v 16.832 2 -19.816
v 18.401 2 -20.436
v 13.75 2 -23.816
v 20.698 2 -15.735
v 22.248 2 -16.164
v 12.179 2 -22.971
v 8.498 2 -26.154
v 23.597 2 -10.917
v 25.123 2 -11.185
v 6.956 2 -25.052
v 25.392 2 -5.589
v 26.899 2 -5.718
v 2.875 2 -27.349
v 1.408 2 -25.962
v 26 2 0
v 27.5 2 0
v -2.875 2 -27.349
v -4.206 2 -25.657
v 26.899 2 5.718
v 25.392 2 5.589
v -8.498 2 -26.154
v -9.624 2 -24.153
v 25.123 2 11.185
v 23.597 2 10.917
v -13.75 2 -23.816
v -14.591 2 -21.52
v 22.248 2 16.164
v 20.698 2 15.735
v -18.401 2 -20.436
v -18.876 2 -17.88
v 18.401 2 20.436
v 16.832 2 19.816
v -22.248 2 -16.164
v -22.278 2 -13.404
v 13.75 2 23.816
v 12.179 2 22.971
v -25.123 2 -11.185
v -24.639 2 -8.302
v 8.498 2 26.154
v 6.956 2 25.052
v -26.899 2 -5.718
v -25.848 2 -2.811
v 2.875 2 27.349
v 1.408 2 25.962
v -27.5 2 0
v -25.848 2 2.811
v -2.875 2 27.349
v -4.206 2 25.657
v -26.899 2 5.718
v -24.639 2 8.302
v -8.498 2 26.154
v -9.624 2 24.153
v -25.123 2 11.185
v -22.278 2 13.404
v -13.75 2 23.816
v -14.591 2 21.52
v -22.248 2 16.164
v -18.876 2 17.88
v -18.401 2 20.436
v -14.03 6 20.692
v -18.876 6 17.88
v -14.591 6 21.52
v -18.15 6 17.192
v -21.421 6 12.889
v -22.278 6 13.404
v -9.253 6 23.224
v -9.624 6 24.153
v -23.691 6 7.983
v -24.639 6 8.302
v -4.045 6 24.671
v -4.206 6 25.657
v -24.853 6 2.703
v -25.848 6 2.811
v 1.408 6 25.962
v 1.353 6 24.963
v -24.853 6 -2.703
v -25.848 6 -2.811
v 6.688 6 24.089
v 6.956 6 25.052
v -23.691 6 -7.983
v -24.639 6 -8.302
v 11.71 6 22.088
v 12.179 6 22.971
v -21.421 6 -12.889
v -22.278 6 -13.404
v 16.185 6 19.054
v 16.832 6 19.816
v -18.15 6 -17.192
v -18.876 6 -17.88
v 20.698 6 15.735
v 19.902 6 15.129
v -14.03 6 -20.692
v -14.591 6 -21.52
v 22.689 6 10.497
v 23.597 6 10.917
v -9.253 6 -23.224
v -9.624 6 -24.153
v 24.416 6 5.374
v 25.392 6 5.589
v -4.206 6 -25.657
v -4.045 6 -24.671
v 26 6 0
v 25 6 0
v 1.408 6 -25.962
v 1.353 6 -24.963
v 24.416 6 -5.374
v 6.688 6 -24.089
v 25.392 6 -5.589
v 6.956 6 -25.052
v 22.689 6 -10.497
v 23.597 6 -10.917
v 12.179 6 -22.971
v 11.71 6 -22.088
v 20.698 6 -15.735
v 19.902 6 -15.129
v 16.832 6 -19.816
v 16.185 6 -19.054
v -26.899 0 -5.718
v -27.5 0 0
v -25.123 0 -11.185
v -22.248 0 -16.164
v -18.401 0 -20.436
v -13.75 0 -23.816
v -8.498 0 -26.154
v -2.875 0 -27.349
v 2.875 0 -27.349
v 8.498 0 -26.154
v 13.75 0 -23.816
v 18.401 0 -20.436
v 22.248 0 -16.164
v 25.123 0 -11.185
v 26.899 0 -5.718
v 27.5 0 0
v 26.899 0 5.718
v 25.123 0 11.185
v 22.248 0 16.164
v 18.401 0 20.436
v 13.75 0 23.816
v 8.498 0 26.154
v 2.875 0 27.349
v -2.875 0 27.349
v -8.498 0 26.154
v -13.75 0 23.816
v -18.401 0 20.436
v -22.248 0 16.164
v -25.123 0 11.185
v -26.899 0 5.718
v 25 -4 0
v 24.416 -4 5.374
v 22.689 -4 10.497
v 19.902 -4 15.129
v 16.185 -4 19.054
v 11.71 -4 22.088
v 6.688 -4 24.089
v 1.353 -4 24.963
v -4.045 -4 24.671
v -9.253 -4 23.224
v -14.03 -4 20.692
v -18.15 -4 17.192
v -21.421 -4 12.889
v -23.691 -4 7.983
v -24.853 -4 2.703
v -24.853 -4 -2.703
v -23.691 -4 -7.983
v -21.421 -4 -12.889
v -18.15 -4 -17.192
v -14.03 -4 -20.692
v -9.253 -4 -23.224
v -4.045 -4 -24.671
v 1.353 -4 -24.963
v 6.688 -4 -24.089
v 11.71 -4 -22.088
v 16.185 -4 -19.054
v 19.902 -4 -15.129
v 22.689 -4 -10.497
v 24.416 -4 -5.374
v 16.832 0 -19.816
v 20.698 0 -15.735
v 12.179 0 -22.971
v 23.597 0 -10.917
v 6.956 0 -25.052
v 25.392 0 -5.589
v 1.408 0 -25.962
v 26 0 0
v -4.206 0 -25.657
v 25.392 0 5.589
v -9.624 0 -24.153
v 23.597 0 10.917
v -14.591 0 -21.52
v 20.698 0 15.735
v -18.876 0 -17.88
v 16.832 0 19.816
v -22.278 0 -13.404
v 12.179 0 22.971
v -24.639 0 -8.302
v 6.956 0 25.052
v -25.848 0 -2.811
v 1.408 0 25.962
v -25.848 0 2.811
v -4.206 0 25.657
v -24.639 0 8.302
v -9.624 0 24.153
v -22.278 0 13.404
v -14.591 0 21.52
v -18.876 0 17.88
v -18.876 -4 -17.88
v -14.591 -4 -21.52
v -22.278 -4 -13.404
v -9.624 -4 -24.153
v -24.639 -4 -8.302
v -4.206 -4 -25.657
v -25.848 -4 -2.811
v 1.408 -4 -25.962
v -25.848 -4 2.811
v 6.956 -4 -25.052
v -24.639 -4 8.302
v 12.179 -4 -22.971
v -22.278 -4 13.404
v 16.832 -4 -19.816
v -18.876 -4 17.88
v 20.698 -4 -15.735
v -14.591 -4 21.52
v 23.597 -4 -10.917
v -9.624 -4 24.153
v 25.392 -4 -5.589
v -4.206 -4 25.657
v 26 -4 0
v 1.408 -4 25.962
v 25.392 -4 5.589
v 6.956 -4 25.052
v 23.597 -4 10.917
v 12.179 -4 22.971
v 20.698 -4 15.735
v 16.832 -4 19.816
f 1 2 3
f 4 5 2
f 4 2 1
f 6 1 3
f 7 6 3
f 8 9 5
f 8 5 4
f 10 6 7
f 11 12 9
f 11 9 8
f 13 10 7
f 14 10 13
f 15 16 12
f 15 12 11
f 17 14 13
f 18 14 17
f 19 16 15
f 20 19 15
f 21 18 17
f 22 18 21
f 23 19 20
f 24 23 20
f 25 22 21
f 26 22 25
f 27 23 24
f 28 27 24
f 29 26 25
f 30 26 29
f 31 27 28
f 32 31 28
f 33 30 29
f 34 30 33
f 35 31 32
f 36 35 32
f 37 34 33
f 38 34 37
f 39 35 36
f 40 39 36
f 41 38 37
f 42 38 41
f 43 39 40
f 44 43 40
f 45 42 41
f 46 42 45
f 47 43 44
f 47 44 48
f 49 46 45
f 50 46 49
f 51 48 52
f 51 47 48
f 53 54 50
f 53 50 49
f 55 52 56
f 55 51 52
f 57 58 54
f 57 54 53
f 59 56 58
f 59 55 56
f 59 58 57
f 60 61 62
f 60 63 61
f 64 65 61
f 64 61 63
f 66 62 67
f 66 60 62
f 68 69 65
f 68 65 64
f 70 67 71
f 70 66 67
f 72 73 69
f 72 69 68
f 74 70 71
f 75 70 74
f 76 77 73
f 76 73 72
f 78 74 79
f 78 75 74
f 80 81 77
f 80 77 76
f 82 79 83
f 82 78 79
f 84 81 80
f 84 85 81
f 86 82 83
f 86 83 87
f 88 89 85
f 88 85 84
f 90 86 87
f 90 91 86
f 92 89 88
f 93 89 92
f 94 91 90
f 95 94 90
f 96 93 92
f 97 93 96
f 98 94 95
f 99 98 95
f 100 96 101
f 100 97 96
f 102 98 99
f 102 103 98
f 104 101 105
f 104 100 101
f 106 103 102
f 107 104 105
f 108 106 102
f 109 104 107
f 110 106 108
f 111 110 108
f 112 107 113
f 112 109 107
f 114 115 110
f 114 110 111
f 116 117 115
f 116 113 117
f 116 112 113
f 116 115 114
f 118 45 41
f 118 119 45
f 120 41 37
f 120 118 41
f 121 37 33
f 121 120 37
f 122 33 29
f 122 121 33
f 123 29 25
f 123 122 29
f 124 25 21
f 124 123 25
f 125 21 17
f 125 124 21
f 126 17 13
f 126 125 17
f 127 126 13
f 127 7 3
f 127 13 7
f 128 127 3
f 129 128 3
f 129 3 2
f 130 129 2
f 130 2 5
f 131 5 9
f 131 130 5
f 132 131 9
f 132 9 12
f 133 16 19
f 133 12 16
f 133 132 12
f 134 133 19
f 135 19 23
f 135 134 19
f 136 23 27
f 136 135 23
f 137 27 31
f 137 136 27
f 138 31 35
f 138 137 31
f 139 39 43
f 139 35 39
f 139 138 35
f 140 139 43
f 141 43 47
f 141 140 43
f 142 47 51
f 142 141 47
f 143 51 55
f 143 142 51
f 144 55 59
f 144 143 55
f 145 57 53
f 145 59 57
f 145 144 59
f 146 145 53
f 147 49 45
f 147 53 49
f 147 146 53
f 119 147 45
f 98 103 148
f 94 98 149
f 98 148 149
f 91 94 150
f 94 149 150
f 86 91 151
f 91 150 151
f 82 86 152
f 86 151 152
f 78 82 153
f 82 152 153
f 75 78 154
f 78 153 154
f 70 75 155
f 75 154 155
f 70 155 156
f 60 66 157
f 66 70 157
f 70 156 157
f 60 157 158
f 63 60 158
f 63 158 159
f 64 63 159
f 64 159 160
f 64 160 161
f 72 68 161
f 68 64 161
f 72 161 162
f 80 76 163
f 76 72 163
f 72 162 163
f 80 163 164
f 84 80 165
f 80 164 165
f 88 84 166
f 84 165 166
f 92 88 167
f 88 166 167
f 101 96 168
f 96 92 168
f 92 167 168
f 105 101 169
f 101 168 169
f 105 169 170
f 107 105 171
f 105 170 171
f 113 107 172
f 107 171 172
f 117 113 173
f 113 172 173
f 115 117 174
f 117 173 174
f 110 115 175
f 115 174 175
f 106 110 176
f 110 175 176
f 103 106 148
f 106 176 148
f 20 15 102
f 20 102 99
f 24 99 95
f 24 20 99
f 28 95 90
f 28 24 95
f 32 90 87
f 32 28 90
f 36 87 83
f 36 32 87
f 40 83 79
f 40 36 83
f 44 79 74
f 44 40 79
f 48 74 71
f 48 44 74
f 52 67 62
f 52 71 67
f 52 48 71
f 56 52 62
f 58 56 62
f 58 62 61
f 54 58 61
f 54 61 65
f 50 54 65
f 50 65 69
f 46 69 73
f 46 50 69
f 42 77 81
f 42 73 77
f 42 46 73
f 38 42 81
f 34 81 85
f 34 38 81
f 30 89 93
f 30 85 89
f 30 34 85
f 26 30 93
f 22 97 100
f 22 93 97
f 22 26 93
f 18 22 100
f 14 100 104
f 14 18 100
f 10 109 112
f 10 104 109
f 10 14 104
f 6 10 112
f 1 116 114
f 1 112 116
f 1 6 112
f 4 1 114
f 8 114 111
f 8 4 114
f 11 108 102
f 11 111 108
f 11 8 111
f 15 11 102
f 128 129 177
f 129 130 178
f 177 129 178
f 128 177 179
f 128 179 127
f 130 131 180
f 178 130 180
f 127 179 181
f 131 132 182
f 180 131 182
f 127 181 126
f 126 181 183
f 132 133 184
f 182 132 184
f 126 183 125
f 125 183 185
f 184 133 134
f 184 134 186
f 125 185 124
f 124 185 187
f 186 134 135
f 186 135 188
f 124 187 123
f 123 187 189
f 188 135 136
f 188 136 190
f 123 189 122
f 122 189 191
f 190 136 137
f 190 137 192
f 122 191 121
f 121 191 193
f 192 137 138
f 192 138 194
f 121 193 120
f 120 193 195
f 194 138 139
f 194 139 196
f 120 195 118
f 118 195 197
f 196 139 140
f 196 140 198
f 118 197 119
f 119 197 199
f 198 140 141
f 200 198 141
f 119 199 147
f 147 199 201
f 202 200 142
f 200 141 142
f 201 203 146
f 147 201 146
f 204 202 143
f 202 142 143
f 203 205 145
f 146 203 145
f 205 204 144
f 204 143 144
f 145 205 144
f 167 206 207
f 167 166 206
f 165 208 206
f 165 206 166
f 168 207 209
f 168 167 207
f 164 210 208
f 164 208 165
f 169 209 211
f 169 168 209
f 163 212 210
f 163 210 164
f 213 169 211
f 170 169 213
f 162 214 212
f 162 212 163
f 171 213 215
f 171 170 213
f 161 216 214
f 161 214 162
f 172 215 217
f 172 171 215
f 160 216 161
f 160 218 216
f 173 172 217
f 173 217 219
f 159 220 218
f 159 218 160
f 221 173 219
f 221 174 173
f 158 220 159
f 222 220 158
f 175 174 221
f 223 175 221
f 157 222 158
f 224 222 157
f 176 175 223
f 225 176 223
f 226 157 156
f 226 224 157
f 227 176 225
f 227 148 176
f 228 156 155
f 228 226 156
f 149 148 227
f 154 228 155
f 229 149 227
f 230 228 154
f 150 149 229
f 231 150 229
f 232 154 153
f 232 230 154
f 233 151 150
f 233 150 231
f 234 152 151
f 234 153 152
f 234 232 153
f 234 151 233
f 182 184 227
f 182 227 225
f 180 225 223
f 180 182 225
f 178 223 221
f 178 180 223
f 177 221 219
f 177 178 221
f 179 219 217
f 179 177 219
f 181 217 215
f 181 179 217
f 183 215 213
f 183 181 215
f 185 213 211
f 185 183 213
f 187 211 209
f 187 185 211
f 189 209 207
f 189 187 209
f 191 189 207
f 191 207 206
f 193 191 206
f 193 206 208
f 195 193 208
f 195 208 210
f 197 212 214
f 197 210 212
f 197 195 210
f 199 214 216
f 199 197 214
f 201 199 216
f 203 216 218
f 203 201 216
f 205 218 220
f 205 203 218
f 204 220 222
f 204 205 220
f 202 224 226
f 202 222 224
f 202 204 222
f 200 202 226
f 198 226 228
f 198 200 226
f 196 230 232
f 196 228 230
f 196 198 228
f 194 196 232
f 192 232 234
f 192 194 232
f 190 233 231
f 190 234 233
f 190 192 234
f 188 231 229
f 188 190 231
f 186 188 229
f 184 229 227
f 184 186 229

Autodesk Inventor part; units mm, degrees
ref_plane "YZ Plane" through (0, 0, 0) normal (1, 0, 0) x (0, 1, 0)
ref_plane "XZ Plane" through (0, 0, 0) normal (0, 1, 0) x (-1, 0, 0)
ref_plane "XY Plane" through (0, 0, 0) normal (0, 0, 1) x (1, 0, 0)
sketch "Sketch5" plane through (0, 0, 0) normal (0, 1, 0) x (-1, 0, 0)
  circle A0 centre (0, 0) radius 27.5
  dimension "d18" = 55
extrude "Extrusion5" add sketch "Sketch5" along normal blind 2
sketch "Sketch6" plane through (0, 2, 0) normal (0, 1, 0) x (1, 0, 0)
  circle A0 centre (0, 0) radius 26
  dimension "d21" = 52
extrude "Extrusion6" add sketch "Sketch6" along normal blind 4
sketch "Sketch7" plane through (0, 6, 0) normal (0, 1, 0) x (1, 0, 0)
  circle A0 centre (0, 0) radius 25
  dimension "d24" = 50
extrude "Extrusion7" cut sketch "Sketch7" against normal through all
thread "Thread4" size "M52x1.5" class "6g" standard "ISO Metric profile" full length
sketch "Sketch8" plane through (0, 0, 0) normal (0, -1, 0) x (1, 0, 0)
  circle A0 centre (0, 0) radius 26
  dimension "d29" = 52
extrude "Extrusion8" add sketch "Sketch8" along normal blind 4
sketch "Sketch9" plane through (0, -4, 0) normal (0, -1, 0) x (1, 0, 0)
  circle A0 centre (0, 0) radius 25
  dimension "d32" = 50
extrude "Extrusion9" cut sketch "Sketch9" against normal blind 4
thread "Thread5" size "M52x1.5" class "6g" standard "ISO Metric profile" full length
properties part number "77mm to 52mm" material "Aluminum 6061-AHC"
